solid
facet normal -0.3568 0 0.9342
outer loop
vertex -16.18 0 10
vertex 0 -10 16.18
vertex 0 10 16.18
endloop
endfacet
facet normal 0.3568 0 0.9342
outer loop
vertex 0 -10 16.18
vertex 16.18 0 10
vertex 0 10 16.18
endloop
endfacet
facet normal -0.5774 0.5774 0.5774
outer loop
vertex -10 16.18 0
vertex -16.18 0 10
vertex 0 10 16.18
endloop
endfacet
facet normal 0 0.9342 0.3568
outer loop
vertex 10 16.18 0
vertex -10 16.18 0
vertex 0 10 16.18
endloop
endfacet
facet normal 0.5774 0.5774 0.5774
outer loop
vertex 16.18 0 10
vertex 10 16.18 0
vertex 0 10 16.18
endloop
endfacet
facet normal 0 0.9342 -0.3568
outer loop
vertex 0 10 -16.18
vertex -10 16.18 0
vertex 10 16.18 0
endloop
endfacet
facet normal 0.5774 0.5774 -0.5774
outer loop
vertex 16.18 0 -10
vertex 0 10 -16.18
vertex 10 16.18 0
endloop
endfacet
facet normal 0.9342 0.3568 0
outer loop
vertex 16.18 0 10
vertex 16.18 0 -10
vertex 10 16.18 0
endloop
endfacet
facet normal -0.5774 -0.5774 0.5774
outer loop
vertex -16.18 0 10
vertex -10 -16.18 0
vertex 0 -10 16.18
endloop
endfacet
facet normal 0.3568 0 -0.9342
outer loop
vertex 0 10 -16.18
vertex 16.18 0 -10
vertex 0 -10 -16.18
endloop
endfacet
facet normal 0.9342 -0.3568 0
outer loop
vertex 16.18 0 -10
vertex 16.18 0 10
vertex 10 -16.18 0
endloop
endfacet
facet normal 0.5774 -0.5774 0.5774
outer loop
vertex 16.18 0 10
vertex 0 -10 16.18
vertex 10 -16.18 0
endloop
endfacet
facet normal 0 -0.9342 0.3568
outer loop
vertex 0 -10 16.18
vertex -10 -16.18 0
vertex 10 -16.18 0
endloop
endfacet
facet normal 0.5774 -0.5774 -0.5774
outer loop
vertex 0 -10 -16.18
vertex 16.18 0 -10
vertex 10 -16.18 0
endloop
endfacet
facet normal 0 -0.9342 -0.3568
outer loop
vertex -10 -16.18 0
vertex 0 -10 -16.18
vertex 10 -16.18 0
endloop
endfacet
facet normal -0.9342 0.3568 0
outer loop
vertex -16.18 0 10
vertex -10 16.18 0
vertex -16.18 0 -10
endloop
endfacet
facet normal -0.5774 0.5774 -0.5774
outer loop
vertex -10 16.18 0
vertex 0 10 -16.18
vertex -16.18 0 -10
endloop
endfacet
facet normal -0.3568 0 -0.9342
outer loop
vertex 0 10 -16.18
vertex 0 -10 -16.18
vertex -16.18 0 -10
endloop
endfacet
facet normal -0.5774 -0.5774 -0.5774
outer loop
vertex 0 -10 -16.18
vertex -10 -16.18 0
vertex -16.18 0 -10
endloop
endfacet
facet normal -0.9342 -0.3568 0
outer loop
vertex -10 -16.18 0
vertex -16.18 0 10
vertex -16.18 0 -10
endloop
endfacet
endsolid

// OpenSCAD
p=(1+sqrt(5))/2;
scale([10,10,10])
polyhedron(
points=[	[0,1,p],[0,-1,p],[0,1,-p],[0,-1,-p],
		[1,p,0],[-1,p,0],[1,-p,0],[-1,-p,0],
		[p,0,1],[-p,0,1],[p,0,-1],[-p,0,-1]],
faces=[	[0,1,9],[0,8,1],[0,9,5],[0,5,4],[0,4,8],
		[4,5,2],[4,2,10],[4,10,8],[1,7,9],[3,10,2],
		[6,8,10],[6,1,8],[6,7,1],[6,10,3],[6,3,7],
		[11,5,9],[11,2,5],[11,3,2],[11,7,3],[11,9,7]]);
